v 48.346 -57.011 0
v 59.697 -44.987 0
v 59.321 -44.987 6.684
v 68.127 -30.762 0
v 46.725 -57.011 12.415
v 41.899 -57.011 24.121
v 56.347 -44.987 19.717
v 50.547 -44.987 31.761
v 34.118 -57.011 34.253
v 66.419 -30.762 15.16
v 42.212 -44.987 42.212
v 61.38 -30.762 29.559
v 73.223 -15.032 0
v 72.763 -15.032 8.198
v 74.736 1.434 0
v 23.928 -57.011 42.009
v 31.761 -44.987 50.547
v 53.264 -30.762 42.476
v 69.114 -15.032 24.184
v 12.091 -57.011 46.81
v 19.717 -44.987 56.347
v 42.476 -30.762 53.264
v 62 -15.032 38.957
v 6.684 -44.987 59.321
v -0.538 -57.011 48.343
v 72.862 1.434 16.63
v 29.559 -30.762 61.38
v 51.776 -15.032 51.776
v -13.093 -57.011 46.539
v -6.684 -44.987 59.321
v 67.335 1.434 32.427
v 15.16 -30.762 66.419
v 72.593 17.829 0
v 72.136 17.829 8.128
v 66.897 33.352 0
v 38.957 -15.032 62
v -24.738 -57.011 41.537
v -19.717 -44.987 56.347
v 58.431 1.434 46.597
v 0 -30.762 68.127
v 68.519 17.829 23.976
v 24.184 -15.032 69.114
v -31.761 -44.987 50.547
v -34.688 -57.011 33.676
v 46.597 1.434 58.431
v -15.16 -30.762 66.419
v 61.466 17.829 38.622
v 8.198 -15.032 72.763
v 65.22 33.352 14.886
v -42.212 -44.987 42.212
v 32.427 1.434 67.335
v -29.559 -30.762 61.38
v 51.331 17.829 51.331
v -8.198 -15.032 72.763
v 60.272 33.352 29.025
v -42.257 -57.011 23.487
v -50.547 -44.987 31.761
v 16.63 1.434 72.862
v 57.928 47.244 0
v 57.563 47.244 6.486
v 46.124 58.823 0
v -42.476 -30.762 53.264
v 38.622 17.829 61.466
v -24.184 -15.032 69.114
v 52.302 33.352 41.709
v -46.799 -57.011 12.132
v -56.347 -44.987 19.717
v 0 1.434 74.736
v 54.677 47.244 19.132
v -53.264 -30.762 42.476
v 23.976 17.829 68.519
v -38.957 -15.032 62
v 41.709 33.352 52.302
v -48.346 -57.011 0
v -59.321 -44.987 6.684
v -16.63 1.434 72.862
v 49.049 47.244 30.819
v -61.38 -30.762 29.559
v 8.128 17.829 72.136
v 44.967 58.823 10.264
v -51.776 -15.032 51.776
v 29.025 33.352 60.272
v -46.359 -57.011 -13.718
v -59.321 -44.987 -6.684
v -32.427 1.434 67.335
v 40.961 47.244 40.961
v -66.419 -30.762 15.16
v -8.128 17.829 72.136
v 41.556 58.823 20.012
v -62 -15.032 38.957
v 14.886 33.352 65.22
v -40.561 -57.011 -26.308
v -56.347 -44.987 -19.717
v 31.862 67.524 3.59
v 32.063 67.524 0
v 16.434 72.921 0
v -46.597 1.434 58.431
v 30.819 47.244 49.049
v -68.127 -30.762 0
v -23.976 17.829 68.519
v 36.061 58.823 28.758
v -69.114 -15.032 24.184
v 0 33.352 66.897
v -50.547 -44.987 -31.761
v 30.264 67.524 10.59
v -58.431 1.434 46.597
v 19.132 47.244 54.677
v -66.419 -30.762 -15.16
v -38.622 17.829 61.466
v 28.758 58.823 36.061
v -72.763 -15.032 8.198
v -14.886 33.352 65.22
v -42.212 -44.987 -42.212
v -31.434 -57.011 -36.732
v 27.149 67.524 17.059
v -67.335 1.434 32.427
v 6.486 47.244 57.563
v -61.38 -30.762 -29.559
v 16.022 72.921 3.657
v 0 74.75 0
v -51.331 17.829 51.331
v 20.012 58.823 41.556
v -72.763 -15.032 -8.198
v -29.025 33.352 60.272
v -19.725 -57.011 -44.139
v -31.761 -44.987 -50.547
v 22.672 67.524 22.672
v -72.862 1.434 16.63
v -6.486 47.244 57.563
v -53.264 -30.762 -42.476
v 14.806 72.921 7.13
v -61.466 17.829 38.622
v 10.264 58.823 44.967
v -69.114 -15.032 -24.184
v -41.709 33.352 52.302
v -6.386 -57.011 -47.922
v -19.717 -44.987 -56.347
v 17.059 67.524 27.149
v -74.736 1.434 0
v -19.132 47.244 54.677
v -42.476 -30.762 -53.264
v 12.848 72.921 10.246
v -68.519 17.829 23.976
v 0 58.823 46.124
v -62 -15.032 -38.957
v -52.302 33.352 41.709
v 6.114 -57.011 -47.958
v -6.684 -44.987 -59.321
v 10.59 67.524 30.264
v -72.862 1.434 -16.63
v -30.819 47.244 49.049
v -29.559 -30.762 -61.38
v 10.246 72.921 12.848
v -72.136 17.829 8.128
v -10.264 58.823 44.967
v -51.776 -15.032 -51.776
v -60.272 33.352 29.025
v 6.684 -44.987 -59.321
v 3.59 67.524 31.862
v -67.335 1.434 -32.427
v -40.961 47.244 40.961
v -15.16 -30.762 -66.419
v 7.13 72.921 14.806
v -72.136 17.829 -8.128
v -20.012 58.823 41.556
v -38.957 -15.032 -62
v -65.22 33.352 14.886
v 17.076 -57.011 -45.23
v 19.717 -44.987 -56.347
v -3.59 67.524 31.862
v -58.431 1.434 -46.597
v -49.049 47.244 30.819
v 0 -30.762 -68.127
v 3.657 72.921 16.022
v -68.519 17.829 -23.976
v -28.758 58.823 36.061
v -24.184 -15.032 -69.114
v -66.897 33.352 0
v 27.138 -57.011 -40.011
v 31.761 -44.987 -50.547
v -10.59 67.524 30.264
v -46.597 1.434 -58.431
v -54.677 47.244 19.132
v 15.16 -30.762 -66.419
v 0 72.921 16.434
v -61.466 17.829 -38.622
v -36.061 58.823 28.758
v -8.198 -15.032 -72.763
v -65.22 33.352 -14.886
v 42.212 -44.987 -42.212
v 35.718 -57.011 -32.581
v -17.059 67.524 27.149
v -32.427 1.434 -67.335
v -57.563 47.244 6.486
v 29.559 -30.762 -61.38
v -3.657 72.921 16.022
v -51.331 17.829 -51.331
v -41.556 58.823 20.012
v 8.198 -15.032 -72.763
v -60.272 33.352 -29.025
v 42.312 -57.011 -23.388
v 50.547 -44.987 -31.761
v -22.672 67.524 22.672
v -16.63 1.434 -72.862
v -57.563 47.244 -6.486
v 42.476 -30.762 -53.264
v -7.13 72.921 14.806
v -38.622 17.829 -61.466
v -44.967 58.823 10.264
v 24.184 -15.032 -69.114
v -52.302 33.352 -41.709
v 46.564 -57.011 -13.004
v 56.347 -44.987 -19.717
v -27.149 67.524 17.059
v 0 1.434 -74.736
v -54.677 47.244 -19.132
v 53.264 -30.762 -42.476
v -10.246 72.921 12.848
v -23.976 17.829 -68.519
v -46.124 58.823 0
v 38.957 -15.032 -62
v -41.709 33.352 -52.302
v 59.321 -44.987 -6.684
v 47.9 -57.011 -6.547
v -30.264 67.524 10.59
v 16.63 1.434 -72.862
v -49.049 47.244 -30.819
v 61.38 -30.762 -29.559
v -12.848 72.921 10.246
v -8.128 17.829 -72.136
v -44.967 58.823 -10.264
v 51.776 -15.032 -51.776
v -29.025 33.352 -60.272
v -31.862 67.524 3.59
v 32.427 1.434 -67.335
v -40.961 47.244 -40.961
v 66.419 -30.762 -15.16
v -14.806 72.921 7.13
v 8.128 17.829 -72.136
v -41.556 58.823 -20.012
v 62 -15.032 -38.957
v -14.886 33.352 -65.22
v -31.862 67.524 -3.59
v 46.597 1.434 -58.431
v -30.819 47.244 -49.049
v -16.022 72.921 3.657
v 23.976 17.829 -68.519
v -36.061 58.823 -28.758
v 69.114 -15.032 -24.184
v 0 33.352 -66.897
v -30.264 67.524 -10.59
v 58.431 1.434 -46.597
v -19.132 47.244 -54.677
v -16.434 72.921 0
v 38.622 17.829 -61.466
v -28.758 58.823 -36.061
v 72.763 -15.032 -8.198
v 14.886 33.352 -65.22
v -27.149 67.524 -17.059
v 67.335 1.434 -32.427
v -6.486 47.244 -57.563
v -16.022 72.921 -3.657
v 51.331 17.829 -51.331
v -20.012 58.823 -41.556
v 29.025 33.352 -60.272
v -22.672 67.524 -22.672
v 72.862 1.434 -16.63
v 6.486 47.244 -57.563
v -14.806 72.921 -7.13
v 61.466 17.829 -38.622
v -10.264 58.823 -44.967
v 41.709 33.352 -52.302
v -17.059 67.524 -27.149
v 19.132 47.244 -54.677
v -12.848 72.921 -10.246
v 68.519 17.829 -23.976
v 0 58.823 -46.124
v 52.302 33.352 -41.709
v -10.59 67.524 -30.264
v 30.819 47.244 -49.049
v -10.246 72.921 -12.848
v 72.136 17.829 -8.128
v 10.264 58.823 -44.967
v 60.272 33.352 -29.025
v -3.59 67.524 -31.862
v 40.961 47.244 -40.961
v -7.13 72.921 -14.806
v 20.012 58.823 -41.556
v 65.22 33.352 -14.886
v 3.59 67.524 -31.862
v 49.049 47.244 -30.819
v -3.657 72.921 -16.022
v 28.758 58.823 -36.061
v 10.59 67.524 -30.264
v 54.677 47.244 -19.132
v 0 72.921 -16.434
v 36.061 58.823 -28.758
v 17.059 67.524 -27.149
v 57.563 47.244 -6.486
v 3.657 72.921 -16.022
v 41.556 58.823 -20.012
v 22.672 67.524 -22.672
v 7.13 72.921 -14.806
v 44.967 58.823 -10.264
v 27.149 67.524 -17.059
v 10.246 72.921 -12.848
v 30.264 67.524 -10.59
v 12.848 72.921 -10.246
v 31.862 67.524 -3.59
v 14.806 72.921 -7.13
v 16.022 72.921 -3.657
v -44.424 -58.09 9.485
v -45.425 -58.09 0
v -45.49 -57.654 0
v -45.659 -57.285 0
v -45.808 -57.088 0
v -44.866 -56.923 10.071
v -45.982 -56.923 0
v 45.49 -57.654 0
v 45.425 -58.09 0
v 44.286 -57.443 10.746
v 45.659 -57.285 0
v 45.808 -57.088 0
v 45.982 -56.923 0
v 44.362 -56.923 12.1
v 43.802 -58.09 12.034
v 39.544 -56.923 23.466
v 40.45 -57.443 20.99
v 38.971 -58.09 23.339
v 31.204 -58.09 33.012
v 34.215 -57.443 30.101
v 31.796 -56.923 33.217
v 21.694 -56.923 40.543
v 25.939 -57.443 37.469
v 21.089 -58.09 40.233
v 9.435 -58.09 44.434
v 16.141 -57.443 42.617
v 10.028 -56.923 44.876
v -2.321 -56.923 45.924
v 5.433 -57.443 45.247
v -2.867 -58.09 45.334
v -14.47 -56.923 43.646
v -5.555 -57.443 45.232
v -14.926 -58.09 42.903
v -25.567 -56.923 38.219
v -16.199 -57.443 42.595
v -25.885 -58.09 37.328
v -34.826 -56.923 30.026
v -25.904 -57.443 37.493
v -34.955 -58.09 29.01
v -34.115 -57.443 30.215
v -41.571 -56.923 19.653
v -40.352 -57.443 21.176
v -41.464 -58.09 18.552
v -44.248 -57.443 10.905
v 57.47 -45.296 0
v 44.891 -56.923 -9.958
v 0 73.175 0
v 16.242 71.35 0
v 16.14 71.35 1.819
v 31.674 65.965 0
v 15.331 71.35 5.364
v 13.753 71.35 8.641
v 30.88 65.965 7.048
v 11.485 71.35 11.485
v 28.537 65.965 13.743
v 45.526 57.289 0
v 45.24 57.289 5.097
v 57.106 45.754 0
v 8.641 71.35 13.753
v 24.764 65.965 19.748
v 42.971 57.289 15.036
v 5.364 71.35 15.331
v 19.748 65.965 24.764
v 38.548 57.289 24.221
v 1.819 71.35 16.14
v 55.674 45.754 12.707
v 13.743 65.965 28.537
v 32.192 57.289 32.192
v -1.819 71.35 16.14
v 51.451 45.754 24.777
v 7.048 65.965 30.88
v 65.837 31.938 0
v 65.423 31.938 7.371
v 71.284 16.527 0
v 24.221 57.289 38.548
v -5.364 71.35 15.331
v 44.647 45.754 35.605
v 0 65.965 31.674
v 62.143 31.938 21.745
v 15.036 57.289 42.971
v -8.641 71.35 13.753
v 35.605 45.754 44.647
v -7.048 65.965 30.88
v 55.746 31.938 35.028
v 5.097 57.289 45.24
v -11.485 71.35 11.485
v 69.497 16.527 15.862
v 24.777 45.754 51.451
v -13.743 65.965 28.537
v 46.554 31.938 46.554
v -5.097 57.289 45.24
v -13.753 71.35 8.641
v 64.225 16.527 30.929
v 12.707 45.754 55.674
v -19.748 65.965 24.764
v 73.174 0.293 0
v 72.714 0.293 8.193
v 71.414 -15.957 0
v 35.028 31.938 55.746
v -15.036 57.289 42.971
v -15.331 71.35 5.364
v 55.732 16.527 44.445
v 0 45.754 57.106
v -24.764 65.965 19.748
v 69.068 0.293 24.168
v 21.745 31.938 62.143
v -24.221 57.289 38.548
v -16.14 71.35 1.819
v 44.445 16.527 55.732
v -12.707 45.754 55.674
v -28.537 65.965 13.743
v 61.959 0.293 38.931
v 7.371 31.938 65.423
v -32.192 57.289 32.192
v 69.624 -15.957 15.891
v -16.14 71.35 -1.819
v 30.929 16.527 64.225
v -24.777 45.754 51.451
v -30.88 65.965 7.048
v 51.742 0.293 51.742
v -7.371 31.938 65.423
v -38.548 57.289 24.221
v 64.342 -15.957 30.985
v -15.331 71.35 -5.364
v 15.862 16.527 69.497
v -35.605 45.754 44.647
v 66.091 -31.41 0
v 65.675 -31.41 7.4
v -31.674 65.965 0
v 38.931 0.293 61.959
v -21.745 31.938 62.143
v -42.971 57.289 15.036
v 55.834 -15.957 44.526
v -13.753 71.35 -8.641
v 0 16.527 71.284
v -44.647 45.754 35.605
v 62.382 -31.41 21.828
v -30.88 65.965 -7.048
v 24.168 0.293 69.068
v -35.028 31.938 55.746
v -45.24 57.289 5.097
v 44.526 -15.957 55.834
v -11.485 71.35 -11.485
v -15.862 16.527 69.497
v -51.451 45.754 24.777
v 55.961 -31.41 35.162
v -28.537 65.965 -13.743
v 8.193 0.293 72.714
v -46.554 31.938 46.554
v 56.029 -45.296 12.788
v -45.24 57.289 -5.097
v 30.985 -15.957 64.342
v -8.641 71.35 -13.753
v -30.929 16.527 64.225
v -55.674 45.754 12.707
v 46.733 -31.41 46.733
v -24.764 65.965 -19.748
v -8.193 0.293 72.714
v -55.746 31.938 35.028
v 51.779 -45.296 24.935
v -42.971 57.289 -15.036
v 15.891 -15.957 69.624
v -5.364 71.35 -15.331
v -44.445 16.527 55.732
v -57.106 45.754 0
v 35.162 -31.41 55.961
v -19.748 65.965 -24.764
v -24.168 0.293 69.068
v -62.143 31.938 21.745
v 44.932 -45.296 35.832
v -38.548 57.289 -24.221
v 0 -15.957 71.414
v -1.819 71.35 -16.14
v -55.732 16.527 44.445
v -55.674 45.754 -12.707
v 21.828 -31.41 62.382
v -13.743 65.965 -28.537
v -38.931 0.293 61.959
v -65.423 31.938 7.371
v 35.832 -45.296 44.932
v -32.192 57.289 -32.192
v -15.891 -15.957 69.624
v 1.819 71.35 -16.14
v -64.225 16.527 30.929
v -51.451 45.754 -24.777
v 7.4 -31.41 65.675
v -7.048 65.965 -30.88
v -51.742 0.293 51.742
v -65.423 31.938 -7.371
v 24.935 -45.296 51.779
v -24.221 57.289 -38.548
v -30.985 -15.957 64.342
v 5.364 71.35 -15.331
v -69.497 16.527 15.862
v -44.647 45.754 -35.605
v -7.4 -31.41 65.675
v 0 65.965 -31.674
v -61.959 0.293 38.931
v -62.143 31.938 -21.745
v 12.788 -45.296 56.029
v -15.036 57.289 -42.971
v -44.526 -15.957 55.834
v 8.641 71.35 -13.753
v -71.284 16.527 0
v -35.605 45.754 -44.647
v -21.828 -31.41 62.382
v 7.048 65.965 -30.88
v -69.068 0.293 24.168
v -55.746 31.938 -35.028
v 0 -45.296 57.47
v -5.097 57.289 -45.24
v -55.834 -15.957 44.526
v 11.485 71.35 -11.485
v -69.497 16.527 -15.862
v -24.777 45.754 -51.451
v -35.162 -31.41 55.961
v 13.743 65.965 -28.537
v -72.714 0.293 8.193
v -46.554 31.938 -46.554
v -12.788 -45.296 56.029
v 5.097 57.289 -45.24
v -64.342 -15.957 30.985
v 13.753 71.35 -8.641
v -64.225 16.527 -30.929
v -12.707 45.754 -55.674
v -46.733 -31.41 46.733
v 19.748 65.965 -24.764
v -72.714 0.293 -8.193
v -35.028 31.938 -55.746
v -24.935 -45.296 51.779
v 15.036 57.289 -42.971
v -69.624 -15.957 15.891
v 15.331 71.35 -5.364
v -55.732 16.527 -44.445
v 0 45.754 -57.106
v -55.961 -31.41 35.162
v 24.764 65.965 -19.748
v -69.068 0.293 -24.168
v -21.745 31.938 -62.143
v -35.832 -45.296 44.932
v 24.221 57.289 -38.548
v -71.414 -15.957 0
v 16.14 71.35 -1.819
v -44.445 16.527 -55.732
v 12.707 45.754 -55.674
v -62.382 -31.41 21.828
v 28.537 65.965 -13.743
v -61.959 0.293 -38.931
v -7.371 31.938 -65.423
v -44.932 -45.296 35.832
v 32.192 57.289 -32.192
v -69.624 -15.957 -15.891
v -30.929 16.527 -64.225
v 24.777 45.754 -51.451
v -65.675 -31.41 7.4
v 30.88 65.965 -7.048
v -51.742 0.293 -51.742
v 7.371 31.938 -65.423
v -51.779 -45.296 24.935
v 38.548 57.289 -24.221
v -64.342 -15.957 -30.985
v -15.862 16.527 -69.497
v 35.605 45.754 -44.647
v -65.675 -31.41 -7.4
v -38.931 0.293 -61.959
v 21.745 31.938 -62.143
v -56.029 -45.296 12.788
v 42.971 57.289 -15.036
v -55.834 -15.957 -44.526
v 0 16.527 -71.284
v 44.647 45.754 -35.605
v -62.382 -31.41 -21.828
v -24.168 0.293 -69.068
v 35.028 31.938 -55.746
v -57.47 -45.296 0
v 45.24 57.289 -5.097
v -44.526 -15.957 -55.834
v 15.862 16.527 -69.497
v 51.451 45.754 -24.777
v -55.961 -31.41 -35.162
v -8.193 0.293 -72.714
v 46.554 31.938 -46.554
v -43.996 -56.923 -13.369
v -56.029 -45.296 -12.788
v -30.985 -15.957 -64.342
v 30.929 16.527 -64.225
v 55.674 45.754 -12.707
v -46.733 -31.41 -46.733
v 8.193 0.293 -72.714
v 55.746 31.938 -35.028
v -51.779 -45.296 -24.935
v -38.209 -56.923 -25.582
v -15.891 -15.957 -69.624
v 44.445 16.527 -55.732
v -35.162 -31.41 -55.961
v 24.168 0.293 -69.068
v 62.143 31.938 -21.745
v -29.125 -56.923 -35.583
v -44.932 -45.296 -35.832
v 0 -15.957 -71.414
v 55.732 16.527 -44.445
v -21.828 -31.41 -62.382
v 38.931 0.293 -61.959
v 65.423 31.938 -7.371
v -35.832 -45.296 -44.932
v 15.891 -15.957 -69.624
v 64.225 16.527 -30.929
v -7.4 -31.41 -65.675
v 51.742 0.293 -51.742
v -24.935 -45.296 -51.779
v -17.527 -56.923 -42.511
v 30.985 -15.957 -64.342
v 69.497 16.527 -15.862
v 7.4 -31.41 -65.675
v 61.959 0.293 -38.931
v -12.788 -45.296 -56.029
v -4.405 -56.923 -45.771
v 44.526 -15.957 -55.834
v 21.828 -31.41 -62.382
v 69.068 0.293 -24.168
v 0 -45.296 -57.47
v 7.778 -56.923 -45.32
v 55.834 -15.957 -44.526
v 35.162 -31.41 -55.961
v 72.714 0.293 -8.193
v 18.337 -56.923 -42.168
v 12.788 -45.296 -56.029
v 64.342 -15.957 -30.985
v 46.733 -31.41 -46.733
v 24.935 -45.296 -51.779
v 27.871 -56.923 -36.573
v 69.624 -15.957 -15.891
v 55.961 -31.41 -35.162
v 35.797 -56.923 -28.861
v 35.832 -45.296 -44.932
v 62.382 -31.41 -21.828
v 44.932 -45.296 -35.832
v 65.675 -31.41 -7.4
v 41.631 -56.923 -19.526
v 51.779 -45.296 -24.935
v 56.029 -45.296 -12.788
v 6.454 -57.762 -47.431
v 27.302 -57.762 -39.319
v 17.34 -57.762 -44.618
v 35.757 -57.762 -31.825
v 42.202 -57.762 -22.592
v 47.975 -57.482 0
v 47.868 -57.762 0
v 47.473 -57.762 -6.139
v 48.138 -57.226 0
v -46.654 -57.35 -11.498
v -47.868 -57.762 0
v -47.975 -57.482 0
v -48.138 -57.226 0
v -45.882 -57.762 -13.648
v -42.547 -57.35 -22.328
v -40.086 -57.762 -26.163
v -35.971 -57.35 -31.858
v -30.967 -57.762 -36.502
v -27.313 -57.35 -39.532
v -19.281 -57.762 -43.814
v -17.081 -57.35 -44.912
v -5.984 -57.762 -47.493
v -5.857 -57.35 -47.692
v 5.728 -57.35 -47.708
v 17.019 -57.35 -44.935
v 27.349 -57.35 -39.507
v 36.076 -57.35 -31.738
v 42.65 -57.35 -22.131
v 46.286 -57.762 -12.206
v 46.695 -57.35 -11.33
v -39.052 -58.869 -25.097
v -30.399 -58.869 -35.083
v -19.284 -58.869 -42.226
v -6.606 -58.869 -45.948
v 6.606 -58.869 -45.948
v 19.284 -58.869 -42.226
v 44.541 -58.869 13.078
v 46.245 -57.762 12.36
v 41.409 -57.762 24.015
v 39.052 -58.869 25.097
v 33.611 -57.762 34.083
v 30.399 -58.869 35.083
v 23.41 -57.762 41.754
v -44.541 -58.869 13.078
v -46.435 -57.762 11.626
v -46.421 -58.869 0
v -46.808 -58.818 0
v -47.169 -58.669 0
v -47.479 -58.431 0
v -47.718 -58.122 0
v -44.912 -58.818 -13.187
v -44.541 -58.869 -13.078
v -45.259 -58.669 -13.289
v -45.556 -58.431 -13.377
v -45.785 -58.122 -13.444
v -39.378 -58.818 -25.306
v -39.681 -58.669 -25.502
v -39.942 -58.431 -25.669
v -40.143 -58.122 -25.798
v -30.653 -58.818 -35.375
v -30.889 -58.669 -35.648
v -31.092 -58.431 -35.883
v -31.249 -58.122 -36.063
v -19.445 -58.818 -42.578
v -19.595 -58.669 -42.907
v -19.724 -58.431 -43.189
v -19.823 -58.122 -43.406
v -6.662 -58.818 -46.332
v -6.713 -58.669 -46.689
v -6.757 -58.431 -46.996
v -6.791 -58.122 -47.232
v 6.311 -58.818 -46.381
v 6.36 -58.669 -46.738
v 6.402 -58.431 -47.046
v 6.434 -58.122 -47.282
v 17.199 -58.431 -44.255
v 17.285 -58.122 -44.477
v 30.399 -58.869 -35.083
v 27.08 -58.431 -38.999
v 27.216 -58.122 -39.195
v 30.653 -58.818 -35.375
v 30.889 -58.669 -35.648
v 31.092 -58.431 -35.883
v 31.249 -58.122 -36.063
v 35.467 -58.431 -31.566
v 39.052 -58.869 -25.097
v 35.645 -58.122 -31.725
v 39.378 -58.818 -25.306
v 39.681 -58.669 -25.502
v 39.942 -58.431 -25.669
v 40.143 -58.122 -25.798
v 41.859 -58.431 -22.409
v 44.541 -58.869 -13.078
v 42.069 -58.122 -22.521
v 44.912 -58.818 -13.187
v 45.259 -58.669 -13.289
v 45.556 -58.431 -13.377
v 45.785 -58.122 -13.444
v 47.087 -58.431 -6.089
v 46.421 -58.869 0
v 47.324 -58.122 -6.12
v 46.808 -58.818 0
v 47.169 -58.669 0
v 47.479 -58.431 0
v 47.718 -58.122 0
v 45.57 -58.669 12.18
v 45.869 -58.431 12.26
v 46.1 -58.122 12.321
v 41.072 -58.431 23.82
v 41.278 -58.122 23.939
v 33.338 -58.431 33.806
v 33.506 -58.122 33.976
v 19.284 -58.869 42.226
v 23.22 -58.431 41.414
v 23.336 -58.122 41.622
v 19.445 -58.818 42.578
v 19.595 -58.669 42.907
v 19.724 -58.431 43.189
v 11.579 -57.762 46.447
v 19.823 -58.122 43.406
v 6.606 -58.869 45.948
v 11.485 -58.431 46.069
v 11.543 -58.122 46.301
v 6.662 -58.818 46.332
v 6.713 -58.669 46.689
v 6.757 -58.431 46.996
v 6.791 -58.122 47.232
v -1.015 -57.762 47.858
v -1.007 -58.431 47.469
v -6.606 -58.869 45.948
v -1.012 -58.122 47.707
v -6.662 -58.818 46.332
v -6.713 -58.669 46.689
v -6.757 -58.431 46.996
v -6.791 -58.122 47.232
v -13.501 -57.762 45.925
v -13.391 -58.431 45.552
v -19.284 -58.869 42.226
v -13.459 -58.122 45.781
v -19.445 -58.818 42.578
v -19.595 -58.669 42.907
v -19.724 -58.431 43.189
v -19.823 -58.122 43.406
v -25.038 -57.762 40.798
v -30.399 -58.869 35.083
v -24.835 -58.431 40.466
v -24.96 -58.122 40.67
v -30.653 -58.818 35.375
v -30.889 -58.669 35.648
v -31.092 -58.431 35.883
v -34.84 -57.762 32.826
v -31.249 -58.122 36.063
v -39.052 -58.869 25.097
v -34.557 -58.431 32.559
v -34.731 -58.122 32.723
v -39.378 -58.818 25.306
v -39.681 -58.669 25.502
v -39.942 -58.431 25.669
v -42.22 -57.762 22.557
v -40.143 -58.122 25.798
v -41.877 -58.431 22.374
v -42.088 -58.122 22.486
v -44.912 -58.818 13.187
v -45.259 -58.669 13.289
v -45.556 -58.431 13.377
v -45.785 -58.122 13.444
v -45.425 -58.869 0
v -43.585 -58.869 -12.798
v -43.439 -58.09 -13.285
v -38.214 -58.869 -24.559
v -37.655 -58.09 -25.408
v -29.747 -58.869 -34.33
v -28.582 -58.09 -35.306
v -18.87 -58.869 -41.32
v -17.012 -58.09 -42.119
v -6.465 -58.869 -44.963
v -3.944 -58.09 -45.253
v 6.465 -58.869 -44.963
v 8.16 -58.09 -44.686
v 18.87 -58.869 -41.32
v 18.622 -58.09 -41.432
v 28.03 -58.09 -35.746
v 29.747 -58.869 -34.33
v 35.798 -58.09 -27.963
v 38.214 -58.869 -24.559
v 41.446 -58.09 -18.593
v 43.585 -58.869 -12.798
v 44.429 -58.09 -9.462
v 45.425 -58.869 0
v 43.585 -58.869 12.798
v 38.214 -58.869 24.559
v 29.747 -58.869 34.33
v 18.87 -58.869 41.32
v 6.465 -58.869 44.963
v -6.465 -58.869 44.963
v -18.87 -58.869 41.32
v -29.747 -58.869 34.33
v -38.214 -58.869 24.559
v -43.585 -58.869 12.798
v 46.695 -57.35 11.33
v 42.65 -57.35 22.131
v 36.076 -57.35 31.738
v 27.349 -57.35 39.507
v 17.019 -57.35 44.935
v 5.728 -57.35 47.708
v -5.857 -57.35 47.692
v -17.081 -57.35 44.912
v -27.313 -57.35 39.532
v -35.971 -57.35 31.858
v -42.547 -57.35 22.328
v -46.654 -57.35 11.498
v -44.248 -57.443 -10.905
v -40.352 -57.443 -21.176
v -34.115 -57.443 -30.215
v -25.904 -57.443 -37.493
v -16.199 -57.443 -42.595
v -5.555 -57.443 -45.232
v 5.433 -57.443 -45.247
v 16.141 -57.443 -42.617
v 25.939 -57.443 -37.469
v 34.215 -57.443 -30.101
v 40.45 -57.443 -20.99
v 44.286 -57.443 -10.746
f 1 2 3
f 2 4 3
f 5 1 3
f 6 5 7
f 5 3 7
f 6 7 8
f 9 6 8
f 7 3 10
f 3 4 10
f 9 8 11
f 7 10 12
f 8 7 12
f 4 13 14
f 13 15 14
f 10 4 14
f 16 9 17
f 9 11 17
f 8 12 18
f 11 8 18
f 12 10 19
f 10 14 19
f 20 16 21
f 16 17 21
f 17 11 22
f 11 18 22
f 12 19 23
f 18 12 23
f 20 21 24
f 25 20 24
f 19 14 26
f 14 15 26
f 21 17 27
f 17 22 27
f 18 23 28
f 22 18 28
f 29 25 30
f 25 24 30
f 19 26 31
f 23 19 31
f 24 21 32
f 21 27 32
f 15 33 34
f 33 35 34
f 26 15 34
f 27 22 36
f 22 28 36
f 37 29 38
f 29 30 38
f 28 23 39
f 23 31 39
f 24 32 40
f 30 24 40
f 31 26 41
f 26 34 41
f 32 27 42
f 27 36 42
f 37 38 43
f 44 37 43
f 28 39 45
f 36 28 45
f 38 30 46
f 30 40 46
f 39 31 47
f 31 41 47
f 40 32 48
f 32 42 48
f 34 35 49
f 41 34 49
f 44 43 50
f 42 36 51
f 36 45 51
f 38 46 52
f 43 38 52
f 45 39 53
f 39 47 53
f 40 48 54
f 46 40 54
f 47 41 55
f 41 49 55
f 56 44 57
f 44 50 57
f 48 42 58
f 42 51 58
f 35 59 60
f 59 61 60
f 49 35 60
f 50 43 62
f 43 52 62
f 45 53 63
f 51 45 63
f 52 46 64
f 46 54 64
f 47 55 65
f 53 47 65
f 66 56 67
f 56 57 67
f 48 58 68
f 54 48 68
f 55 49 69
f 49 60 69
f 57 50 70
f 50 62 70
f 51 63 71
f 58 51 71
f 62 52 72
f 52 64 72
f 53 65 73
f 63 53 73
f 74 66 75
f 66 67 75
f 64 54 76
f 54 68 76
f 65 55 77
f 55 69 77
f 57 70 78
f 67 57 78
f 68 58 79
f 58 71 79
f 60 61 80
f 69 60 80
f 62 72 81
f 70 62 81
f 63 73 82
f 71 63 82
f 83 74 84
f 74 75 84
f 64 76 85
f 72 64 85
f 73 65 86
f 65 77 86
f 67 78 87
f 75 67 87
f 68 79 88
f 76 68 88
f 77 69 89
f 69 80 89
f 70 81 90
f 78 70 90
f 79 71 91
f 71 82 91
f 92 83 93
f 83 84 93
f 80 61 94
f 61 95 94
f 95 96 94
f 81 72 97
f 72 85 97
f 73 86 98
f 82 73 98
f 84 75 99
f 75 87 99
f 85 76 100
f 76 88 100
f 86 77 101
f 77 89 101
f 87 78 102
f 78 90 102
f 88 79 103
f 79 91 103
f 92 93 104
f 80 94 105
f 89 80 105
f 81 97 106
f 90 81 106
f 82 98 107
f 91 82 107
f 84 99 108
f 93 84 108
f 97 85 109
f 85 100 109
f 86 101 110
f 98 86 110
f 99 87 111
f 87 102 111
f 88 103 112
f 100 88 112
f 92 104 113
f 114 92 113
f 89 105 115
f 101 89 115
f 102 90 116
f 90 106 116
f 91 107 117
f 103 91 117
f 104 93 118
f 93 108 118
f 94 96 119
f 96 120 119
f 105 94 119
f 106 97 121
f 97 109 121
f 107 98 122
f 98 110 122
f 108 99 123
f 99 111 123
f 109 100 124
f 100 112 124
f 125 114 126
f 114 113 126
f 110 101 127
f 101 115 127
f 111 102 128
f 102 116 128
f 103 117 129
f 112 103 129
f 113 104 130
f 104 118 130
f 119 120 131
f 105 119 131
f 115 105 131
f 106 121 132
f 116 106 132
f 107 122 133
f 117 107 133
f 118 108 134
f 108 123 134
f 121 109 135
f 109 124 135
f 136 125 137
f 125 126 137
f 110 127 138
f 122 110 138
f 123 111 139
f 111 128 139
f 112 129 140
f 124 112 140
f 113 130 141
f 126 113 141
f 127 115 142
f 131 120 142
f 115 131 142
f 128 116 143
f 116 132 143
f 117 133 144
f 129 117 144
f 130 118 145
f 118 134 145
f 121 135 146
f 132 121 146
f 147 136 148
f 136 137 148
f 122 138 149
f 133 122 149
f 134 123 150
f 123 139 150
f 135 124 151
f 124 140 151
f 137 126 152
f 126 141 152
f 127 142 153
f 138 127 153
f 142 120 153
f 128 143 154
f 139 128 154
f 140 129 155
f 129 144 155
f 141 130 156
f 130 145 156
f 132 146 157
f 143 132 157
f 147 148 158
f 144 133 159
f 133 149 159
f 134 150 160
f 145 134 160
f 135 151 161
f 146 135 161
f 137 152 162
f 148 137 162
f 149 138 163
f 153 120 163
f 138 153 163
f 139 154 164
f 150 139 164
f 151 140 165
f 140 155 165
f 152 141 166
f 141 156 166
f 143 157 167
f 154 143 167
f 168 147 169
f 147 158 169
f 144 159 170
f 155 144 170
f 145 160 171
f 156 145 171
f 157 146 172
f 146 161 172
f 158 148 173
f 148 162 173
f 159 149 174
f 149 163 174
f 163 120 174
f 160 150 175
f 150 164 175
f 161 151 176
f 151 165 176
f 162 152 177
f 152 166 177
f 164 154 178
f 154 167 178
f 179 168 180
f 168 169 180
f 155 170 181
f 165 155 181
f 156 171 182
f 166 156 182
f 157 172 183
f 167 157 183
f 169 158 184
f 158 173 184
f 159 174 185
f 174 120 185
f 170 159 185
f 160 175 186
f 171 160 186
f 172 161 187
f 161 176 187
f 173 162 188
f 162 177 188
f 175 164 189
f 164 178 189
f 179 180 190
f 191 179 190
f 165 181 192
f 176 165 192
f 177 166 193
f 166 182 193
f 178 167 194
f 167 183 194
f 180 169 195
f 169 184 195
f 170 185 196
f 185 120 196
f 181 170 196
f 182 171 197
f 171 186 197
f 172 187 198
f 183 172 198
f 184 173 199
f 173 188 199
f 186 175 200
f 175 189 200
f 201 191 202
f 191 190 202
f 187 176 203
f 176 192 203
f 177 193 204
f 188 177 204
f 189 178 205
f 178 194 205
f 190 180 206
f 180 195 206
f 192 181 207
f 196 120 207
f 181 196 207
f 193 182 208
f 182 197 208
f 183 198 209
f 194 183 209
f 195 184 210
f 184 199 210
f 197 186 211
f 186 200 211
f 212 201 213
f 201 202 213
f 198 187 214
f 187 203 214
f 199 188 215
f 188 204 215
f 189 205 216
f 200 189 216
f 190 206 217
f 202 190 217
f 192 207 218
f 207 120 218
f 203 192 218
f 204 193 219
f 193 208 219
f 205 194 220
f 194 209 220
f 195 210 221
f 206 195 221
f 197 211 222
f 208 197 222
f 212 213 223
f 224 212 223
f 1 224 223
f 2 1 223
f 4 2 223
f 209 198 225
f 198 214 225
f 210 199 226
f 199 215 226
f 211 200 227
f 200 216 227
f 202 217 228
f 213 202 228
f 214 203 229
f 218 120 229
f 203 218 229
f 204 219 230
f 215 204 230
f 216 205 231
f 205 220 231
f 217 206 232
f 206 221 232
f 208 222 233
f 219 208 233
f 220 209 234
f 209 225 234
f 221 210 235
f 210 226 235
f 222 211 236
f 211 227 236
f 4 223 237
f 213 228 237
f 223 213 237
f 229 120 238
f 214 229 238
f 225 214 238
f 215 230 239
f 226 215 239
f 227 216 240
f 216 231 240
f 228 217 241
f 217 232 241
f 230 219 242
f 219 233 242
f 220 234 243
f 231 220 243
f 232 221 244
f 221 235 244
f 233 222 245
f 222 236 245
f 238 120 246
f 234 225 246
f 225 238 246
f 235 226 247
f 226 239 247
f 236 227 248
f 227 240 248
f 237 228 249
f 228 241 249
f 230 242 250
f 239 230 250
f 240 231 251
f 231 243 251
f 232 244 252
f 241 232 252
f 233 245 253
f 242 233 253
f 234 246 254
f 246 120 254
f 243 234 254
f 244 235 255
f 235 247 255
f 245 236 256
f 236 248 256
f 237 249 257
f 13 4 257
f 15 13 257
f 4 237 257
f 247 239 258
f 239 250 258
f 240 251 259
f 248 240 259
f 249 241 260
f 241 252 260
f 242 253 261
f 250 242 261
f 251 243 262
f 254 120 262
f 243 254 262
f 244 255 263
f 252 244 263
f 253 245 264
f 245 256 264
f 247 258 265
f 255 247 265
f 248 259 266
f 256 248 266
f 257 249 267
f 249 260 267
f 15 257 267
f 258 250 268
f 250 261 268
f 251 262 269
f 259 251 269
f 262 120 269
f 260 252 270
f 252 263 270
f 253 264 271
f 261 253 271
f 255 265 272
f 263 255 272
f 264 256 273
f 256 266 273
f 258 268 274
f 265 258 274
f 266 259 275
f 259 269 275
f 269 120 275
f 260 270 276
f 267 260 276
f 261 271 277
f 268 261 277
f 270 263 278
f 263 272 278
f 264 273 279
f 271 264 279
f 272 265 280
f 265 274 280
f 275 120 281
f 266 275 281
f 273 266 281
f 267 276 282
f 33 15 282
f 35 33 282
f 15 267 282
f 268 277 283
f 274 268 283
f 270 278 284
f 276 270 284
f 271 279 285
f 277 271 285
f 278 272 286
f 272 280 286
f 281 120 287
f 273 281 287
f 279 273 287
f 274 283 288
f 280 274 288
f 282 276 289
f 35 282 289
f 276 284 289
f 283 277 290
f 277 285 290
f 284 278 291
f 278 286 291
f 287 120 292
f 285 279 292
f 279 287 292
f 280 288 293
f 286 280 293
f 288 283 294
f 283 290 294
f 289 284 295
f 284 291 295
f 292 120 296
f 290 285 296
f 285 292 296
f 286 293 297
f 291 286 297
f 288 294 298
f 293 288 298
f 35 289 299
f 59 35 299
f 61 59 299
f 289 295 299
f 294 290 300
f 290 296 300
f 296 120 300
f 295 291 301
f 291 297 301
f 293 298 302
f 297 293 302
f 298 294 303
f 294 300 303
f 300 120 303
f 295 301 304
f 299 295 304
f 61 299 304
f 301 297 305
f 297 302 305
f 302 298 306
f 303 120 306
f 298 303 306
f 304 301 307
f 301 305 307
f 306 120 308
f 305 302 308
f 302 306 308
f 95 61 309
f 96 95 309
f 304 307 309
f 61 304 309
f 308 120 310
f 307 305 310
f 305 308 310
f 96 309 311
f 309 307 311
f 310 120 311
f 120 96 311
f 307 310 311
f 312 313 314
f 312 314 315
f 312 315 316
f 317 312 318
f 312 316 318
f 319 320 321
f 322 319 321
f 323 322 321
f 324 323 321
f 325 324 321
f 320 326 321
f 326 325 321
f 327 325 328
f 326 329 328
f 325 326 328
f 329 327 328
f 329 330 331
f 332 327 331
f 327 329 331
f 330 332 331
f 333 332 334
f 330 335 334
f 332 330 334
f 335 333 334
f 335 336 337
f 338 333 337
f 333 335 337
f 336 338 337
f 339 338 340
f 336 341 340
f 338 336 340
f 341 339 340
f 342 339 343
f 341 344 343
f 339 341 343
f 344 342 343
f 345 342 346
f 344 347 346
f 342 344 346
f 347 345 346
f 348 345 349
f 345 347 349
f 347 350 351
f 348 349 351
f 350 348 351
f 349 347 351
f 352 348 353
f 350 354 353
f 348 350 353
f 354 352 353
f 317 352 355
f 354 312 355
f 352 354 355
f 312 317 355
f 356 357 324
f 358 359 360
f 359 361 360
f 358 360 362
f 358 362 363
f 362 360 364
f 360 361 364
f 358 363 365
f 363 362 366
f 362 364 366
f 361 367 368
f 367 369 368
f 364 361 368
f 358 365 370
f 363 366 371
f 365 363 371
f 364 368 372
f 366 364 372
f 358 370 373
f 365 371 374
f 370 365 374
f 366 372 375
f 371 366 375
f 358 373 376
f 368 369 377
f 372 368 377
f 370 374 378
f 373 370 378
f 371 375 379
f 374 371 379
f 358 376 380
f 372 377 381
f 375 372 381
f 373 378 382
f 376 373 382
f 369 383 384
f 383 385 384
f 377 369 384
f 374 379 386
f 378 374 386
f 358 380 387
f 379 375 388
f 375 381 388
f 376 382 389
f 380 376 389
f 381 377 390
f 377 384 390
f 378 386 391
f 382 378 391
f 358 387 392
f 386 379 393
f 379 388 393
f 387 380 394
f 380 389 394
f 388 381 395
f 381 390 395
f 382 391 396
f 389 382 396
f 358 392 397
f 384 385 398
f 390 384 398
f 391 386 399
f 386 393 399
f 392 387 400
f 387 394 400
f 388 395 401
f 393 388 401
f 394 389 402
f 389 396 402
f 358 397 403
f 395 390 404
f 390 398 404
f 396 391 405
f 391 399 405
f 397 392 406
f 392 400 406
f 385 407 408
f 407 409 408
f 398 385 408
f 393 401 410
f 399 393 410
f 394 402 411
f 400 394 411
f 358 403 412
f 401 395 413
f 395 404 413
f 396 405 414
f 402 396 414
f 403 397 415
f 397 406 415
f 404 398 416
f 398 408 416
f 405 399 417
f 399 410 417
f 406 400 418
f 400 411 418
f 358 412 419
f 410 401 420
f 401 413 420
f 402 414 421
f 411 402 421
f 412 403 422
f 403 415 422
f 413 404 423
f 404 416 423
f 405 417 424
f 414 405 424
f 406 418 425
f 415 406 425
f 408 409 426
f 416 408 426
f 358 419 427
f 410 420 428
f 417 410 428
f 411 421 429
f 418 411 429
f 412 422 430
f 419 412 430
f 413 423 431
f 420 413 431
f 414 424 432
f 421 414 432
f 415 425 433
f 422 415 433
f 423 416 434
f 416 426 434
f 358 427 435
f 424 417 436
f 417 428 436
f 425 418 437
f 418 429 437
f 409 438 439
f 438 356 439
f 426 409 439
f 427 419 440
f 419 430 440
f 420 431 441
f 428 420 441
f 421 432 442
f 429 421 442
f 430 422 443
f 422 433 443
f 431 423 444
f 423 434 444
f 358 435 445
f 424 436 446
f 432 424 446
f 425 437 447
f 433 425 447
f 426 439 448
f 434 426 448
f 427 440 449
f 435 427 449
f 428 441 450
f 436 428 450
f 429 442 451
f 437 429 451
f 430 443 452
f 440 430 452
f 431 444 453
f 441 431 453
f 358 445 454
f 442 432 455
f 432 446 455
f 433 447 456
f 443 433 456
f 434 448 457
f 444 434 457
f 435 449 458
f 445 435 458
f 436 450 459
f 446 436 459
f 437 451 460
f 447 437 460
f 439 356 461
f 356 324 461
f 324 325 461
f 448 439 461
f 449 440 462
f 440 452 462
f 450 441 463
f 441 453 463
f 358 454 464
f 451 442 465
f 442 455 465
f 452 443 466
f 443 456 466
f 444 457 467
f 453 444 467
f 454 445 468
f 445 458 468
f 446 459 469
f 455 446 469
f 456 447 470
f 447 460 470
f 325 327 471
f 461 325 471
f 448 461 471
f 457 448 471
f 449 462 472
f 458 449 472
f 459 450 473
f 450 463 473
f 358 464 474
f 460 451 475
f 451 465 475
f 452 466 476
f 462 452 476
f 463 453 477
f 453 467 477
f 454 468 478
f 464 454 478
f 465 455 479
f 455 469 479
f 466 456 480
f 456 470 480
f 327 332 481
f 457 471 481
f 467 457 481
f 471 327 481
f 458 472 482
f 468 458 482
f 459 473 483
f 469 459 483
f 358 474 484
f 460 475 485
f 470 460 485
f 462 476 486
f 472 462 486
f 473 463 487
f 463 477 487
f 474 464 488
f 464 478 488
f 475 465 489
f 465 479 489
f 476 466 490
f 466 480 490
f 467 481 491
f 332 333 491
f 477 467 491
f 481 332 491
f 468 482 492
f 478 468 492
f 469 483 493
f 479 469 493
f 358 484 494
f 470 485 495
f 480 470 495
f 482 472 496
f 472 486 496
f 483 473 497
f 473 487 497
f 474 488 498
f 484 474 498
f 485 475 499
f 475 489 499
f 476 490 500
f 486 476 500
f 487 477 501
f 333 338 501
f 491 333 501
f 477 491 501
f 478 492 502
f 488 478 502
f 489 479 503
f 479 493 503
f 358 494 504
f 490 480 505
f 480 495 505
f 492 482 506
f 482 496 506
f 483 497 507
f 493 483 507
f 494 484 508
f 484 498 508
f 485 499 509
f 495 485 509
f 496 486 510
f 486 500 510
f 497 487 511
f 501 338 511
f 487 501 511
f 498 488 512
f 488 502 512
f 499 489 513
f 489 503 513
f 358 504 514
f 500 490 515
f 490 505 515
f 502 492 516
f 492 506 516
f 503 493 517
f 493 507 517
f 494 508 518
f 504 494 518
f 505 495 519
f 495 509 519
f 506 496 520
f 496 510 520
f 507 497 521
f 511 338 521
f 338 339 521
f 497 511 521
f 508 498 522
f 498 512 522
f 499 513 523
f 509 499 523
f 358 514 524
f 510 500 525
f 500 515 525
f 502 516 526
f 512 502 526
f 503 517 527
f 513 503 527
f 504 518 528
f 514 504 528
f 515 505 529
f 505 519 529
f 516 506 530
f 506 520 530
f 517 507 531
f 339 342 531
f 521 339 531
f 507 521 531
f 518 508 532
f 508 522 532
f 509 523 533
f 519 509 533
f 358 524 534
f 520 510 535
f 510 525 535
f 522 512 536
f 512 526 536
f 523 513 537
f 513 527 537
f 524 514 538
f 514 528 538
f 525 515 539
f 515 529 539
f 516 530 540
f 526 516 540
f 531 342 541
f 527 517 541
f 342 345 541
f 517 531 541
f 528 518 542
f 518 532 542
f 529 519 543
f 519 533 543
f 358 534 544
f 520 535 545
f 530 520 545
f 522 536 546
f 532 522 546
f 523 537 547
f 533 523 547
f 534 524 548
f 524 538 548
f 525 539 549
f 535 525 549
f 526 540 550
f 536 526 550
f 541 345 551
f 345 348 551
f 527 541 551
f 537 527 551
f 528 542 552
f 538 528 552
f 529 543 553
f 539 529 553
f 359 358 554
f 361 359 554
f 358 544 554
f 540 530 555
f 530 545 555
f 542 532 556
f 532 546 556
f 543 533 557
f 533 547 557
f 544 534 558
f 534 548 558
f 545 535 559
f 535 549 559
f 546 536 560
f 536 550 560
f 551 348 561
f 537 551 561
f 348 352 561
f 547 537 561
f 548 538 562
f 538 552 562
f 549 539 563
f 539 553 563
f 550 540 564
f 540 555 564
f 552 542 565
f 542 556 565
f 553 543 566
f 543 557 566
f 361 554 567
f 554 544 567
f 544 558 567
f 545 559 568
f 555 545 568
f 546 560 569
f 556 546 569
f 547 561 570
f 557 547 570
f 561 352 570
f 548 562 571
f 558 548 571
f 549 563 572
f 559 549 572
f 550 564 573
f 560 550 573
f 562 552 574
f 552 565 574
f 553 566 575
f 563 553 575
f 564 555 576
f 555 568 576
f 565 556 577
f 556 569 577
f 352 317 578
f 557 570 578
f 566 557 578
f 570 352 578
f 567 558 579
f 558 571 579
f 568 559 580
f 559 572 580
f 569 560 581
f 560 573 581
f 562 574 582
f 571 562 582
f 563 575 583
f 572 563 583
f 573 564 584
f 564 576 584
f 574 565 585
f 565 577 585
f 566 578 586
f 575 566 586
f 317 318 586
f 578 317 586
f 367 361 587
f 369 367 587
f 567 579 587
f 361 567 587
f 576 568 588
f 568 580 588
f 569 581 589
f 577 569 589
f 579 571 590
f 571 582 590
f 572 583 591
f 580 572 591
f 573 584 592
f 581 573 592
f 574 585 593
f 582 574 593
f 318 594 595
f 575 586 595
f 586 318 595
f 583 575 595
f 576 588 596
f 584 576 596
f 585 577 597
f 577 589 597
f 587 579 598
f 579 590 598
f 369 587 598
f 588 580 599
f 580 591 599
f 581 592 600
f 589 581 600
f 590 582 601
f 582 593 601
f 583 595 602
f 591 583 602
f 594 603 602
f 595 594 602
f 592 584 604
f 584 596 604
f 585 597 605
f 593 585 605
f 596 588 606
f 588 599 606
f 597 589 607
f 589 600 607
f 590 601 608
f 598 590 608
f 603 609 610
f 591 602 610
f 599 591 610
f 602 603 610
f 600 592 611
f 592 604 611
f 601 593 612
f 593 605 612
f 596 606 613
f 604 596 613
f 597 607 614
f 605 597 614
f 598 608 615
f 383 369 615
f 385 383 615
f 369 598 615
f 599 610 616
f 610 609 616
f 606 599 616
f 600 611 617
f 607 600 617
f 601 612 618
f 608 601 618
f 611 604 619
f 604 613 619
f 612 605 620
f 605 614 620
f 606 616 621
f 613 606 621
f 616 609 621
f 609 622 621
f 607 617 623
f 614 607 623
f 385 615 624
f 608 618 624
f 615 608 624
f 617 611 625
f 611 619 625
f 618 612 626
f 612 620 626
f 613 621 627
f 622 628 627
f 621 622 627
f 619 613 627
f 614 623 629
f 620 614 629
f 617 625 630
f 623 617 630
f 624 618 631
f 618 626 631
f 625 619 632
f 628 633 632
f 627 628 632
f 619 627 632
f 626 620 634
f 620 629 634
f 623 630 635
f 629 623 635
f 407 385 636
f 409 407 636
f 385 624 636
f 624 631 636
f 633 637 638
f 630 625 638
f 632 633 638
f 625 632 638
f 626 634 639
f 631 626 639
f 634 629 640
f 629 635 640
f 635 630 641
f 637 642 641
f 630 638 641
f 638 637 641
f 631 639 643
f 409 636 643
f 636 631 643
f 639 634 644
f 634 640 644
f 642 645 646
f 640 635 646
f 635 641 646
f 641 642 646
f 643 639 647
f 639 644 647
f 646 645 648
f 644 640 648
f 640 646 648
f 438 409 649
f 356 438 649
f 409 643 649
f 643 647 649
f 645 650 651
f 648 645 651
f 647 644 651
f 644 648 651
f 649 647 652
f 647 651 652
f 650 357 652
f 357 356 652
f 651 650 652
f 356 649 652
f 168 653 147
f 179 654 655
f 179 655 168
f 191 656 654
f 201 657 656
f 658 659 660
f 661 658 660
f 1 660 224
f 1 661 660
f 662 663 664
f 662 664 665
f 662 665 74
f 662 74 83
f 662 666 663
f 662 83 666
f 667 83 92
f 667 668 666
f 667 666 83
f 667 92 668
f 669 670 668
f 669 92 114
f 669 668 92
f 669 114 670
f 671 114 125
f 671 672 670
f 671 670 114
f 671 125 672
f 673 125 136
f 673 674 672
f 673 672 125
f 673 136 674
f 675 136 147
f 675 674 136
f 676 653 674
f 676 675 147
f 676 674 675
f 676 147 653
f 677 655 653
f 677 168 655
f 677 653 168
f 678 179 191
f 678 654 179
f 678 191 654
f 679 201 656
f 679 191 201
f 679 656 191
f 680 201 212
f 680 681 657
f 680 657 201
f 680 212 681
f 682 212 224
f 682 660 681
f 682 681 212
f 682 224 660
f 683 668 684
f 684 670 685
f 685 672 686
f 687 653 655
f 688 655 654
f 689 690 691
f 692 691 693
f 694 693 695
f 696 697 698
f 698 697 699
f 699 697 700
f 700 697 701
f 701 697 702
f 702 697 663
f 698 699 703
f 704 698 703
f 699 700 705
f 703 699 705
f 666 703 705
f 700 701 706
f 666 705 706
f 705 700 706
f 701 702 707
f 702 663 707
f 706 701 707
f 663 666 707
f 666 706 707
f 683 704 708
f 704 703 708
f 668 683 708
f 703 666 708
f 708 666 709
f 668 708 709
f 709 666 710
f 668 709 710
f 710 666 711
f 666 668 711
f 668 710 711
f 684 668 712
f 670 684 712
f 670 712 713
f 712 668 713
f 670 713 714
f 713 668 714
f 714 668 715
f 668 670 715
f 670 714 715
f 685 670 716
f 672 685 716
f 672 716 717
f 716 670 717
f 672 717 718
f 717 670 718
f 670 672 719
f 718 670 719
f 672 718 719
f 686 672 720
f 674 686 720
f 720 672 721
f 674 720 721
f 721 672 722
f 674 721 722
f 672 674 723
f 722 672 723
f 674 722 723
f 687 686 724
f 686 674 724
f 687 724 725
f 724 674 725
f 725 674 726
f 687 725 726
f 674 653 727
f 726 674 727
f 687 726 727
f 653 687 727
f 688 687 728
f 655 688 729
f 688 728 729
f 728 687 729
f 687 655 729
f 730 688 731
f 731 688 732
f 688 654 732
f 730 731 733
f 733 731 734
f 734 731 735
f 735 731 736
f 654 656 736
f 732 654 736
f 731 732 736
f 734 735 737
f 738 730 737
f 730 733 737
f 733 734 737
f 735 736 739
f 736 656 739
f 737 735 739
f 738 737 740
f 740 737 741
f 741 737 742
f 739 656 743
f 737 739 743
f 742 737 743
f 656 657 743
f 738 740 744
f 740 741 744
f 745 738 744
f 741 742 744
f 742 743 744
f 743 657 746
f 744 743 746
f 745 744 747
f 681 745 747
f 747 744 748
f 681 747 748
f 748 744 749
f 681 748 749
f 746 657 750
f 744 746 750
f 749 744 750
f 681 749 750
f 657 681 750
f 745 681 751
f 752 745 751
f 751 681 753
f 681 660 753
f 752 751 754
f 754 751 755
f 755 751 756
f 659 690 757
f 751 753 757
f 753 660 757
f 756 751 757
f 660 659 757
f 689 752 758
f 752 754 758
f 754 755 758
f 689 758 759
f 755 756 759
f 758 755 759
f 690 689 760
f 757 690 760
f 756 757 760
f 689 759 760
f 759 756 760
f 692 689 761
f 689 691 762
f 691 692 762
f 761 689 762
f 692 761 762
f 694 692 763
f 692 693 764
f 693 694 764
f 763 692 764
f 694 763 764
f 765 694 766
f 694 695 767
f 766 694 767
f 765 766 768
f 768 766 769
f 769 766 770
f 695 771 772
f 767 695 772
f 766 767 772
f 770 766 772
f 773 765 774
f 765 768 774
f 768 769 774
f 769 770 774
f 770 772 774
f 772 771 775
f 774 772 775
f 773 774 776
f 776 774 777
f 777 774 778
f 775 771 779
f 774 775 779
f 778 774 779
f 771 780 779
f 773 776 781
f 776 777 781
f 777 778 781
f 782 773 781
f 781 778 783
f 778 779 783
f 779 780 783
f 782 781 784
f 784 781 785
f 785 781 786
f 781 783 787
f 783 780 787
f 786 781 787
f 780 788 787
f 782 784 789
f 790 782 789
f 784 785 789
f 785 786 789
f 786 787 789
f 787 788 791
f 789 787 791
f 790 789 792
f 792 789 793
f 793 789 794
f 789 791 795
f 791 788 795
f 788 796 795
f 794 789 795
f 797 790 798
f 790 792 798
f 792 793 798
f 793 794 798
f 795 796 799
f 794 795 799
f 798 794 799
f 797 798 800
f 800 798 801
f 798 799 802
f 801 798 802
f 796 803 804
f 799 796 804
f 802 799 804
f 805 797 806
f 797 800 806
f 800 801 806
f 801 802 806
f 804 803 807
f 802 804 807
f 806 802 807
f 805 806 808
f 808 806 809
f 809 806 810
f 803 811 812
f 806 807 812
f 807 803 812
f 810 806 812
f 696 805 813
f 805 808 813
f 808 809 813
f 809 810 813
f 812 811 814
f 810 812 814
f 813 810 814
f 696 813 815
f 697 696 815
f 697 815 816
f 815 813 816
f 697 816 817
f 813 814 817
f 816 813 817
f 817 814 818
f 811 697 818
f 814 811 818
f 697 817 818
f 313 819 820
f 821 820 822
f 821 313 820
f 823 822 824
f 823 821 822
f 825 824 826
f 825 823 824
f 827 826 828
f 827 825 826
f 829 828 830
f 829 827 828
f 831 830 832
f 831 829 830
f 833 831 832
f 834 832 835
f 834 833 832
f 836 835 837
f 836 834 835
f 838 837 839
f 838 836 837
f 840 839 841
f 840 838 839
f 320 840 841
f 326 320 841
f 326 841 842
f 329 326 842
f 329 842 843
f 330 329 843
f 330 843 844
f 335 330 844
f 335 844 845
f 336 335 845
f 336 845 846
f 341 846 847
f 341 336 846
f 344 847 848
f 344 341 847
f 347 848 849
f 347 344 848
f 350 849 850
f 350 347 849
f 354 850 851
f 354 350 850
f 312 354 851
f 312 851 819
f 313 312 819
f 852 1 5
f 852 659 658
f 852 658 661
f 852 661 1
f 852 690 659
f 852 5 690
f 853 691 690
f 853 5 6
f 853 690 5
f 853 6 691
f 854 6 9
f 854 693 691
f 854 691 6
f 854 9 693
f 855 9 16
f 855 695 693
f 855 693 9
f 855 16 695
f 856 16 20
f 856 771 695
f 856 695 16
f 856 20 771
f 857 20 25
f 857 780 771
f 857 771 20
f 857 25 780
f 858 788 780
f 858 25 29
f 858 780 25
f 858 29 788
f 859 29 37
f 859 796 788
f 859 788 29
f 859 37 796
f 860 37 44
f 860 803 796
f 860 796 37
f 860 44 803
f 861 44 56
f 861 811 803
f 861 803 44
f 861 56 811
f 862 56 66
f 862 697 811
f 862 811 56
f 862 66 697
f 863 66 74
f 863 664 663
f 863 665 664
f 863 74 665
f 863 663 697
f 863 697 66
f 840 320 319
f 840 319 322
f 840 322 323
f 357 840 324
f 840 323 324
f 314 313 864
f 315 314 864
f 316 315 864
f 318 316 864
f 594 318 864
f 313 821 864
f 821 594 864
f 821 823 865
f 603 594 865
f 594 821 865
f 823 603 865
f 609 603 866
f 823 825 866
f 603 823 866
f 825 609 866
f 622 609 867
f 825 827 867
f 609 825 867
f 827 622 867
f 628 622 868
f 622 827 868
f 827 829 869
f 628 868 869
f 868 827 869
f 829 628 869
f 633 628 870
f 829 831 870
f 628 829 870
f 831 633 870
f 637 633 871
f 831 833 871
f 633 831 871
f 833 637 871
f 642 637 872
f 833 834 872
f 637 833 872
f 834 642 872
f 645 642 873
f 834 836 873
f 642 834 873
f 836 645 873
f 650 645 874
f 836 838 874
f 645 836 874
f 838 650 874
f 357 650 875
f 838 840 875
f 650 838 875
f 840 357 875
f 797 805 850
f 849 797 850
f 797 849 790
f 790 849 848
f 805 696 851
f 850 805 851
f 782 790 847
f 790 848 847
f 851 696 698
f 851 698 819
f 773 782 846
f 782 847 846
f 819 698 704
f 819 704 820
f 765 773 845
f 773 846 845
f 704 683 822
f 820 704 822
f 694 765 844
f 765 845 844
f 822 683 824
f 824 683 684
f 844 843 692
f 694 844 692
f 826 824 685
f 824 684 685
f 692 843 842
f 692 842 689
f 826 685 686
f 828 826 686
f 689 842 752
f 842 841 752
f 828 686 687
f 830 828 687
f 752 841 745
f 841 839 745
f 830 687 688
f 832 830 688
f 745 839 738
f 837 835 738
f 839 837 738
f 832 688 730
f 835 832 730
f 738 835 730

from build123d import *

# Parameters (mm, degrees)
CUT_EXTRUDE1_DEPTH = 65
SKETCH4_W          = 2.495898364
SKETCH4_H          = 1.5
FILLET1_R          = 1.5
FILLET2_R          = 1.5
FILLET3_R          = 1.5


with BuildPart() as part:
    # Sketch1 → Revolve1 (revolve)
    with BuildSketch(Plane.XY):
        with BuildLine():
            Line((0, 74.75), (0, 73.175))
            ThreePointArc((0, 73.175), (73.175, 0), (0, -73.175))
            Line((0, -73.175), (0, -74.75))
            ThreePointArc((0, -74.75), (74.75, 0), (0, 74.75))
        make_face()
    revolve(axis=Axis((0, 74.75, 0), (0, -1, 0)))

    # Sketch3 → Cut-Extrude1 (cut, symmetric)
    with BuildSketch(Plane.XY):
        Polygon((45.425, -57.368545389), (-45.425, -57.368545389), (-47.920898364, -57.368545389), (-47.920898364, -74.75), (47.920898364, -74.75), (47.920898364, -57.368545389), align=None)
    extrude(amount=CUT_EXTRUDE1_DEPTH, both=True, mode=Mode.SUBTRACT)

    # Sketch4 → Revolve2 (revolve)
    with BuildSketch(Plane.XY, mode=Mode.PRIVATE) as revolve2_sk:
        with Locations((46.672949182, -58.118545389)):
            Rectangle(SKETCH4_W, SKETCH4_H)
    revolve(revolve2_sk.sketch.rotate(Axis((0, -73.175, 0), (0, -1, 0)), 180), axis=Axis((0, -73.175, 0), (0, -1, 0)))

    # Fillet1
    fillet1_edges = [part.edges().sort_by_distance(p)[0] for p in [
        (47.920898364, -58.868545389, 0),
    ]]
    fillet(fillet1_edges, radius=FILLET1_R - 0.0001)  # a hair under: the kernel refuses the full size

    # Fillet2
    fillet2_edges = [part.edges().sort_by_distance(p)[0] for p in [
        (0, -57.368545389, -47.920898364),
    ]]
    fillet(fillet2_edges, radius=FILLET2_R)

    # Fillet3
    fillet3_edges = [part.edges().sort_by_distance(p)[0] for p in [
        (0, -57.368545389, -45.425),
    ]]
    fillet(fillet3_edges, radius=FILLET3_R)


solid = part.part
